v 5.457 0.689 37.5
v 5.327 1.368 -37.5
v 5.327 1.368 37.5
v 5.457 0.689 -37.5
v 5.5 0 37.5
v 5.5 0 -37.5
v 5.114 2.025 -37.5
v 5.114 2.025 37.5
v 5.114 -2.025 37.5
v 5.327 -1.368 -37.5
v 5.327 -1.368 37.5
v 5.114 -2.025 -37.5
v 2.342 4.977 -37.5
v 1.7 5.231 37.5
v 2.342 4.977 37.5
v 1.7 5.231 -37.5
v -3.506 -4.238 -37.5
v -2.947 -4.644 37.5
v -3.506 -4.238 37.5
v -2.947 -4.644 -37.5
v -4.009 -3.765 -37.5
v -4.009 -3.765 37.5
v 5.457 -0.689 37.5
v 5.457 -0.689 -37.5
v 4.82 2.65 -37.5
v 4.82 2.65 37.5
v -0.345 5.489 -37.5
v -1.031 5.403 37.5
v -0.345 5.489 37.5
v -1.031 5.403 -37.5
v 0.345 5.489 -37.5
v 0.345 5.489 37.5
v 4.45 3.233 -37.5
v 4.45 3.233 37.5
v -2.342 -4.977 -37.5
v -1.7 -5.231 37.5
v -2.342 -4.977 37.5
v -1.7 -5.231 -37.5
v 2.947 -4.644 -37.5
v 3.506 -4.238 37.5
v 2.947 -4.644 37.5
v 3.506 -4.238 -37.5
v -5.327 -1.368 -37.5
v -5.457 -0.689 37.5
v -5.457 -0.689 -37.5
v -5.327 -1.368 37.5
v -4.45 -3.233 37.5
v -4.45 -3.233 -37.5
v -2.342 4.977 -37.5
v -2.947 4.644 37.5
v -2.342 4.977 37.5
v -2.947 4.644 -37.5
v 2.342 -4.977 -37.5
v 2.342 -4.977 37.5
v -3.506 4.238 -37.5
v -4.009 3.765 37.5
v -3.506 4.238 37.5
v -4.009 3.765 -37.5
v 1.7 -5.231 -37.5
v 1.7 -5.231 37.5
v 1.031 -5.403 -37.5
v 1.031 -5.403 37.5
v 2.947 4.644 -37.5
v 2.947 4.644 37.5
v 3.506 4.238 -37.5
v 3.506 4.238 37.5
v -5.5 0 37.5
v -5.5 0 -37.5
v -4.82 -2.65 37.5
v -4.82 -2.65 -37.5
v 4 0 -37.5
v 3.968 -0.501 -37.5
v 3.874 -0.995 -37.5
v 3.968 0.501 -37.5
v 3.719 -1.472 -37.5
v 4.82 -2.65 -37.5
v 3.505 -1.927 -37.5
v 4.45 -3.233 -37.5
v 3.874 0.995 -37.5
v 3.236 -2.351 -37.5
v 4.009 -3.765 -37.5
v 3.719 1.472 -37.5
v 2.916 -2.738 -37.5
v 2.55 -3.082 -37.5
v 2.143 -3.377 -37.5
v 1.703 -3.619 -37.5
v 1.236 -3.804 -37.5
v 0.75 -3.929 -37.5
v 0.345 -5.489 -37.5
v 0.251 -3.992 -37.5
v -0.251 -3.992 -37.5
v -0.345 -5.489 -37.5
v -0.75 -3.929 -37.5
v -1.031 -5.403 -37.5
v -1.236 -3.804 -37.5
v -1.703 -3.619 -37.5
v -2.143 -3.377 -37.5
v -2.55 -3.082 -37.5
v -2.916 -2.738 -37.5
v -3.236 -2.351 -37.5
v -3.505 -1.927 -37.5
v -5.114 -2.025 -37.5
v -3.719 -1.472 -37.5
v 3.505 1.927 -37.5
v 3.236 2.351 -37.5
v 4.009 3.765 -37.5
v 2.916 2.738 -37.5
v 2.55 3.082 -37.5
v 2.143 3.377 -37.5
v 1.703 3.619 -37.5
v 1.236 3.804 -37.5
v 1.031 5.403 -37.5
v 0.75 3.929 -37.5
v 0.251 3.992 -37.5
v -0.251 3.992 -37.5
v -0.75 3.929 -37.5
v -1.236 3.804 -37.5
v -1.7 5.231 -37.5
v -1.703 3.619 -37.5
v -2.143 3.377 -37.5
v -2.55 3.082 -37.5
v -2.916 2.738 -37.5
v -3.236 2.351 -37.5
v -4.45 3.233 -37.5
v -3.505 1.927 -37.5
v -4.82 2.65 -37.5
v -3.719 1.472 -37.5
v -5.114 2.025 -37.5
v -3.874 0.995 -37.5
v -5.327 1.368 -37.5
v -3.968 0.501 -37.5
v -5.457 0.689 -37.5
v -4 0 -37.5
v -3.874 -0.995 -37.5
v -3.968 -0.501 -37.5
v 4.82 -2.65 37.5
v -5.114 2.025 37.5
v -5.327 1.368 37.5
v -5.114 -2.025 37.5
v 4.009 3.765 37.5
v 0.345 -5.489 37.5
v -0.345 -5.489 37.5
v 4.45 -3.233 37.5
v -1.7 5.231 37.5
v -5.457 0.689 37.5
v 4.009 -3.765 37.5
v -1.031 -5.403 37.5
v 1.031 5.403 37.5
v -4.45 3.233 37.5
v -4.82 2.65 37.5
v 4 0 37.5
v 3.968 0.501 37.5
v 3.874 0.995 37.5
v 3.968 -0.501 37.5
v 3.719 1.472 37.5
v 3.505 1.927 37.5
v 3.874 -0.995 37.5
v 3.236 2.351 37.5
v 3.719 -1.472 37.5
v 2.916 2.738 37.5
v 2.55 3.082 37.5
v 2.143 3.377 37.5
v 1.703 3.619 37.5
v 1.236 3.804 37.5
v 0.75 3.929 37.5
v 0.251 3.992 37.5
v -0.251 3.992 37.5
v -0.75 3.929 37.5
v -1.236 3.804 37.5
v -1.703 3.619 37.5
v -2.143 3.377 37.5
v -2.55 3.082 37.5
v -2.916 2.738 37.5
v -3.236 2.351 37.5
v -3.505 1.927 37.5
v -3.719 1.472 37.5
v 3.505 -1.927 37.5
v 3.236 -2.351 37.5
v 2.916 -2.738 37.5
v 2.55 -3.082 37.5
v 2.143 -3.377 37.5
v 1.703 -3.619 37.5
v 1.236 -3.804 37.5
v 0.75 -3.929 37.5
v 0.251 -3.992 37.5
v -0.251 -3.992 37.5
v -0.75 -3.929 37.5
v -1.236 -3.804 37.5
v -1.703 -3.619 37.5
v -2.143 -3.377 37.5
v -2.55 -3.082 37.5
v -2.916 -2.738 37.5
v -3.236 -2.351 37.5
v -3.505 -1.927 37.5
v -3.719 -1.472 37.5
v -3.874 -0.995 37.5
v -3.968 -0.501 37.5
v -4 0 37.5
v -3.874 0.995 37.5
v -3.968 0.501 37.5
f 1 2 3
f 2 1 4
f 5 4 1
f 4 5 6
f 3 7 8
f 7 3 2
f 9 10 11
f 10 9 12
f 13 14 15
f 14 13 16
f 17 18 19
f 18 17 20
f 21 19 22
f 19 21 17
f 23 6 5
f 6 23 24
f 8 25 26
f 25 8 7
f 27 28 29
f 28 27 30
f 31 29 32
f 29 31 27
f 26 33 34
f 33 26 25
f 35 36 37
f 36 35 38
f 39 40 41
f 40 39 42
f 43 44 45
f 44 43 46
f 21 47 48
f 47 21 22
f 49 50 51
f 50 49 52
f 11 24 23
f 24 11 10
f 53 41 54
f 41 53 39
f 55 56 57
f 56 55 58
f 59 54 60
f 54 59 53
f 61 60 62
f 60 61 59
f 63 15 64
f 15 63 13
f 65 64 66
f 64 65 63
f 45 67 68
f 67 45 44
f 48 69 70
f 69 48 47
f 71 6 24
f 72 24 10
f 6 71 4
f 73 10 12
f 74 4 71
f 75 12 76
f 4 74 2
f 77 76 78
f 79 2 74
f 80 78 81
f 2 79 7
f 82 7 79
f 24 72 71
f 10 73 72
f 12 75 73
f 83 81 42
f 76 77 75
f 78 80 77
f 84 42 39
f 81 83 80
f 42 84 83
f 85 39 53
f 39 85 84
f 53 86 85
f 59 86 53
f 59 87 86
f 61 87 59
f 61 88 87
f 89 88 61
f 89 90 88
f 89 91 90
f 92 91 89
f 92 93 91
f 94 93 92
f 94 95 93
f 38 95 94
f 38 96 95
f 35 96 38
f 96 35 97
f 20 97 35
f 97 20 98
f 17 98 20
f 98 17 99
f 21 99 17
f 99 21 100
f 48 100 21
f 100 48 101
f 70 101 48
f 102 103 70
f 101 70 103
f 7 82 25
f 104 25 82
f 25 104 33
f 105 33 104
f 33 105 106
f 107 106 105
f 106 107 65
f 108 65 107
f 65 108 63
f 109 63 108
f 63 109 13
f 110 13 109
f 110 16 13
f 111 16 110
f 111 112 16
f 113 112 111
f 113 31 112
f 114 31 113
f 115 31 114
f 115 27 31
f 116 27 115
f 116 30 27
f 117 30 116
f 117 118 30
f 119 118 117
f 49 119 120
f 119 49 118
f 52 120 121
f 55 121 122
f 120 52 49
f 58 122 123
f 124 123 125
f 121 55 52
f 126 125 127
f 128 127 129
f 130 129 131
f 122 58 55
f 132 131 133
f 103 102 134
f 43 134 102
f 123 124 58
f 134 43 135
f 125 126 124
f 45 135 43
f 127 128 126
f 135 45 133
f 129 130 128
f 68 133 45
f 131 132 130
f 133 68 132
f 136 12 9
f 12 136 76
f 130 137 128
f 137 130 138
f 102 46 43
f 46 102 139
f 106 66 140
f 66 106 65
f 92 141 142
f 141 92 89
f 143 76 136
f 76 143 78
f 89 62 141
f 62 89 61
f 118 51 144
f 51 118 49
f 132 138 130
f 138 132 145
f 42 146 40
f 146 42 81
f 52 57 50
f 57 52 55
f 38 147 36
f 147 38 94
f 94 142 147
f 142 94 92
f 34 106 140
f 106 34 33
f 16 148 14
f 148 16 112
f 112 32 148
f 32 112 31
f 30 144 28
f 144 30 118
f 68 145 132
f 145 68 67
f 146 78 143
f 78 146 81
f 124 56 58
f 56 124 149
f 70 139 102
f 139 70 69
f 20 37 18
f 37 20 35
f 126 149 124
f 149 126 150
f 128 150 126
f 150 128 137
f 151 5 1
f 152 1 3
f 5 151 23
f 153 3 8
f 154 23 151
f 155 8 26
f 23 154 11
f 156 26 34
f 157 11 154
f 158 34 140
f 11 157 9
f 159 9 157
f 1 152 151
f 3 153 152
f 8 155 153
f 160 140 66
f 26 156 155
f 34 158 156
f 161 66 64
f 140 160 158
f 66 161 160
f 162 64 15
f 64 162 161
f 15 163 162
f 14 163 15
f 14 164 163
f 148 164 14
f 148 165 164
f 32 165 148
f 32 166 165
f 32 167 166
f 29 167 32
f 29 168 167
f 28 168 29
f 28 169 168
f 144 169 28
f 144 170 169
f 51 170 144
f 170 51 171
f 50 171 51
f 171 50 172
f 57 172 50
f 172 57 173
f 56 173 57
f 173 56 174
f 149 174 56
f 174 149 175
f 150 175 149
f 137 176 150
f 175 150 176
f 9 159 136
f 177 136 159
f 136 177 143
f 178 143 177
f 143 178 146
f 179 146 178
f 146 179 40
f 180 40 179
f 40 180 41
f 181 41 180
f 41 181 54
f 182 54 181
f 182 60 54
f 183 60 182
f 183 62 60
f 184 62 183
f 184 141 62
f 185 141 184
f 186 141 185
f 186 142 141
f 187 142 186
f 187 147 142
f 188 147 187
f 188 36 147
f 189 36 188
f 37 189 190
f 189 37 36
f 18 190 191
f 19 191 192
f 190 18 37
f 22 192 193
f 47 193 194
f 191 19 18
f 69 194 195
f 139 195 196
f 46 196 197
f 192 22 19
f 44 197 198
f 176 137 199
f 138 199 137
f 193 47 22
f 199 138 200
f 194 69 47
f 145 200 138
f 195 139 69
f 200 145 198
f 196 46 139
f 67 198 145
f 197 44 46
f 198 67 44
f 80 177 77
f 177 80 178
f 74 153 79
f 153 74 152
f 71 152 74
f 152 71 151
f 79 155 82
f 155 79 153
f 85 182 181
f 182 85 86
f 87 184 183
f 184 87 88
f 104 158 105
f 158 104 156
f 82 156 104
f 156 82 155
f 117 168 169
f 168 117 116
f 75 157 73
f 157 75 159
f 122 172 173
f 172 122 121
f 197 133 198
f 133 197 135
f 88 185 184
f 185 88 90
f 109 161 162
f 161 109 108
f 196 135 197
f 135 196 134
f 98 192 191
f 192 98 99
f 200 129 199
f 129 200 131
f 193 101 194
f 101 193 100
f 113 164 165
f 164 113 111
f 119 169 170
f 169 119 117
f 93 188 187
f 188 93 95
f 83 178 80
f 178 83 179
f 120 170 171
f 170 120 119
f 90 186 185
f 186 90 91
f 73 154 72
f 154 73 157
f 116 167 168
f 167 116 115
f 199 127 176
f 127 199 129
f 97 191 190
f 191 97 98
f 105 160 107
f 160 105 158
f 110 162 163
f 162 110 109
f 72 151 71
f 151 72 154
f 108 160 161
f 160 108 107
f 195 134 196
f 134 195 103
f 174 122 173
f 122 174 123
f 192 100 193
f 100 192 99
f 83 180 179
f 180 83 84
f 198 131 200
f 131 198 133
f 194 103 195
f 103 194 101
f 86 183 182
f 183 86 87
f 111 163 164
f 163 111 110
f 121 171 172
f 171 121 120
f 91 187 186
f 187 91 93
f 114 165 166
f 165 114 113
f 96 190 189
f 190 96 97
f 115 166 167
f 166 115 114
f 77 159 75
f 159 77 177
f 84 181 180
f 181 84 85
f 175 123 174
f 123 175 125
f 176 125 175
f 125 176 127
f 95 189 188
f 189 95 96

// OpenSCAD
$fn = 50;


difference() {
	union() {
		translate(v = [0, 0, -37.5000000000]) {
			cylinder(h = 75, r = 5.5000000000);
		}
	}
	union() {
		translate(v = [0, 0, -100.0000000000]) {
			cylinder(h = 200, r = 4.0000000000);
		}
	}
}
